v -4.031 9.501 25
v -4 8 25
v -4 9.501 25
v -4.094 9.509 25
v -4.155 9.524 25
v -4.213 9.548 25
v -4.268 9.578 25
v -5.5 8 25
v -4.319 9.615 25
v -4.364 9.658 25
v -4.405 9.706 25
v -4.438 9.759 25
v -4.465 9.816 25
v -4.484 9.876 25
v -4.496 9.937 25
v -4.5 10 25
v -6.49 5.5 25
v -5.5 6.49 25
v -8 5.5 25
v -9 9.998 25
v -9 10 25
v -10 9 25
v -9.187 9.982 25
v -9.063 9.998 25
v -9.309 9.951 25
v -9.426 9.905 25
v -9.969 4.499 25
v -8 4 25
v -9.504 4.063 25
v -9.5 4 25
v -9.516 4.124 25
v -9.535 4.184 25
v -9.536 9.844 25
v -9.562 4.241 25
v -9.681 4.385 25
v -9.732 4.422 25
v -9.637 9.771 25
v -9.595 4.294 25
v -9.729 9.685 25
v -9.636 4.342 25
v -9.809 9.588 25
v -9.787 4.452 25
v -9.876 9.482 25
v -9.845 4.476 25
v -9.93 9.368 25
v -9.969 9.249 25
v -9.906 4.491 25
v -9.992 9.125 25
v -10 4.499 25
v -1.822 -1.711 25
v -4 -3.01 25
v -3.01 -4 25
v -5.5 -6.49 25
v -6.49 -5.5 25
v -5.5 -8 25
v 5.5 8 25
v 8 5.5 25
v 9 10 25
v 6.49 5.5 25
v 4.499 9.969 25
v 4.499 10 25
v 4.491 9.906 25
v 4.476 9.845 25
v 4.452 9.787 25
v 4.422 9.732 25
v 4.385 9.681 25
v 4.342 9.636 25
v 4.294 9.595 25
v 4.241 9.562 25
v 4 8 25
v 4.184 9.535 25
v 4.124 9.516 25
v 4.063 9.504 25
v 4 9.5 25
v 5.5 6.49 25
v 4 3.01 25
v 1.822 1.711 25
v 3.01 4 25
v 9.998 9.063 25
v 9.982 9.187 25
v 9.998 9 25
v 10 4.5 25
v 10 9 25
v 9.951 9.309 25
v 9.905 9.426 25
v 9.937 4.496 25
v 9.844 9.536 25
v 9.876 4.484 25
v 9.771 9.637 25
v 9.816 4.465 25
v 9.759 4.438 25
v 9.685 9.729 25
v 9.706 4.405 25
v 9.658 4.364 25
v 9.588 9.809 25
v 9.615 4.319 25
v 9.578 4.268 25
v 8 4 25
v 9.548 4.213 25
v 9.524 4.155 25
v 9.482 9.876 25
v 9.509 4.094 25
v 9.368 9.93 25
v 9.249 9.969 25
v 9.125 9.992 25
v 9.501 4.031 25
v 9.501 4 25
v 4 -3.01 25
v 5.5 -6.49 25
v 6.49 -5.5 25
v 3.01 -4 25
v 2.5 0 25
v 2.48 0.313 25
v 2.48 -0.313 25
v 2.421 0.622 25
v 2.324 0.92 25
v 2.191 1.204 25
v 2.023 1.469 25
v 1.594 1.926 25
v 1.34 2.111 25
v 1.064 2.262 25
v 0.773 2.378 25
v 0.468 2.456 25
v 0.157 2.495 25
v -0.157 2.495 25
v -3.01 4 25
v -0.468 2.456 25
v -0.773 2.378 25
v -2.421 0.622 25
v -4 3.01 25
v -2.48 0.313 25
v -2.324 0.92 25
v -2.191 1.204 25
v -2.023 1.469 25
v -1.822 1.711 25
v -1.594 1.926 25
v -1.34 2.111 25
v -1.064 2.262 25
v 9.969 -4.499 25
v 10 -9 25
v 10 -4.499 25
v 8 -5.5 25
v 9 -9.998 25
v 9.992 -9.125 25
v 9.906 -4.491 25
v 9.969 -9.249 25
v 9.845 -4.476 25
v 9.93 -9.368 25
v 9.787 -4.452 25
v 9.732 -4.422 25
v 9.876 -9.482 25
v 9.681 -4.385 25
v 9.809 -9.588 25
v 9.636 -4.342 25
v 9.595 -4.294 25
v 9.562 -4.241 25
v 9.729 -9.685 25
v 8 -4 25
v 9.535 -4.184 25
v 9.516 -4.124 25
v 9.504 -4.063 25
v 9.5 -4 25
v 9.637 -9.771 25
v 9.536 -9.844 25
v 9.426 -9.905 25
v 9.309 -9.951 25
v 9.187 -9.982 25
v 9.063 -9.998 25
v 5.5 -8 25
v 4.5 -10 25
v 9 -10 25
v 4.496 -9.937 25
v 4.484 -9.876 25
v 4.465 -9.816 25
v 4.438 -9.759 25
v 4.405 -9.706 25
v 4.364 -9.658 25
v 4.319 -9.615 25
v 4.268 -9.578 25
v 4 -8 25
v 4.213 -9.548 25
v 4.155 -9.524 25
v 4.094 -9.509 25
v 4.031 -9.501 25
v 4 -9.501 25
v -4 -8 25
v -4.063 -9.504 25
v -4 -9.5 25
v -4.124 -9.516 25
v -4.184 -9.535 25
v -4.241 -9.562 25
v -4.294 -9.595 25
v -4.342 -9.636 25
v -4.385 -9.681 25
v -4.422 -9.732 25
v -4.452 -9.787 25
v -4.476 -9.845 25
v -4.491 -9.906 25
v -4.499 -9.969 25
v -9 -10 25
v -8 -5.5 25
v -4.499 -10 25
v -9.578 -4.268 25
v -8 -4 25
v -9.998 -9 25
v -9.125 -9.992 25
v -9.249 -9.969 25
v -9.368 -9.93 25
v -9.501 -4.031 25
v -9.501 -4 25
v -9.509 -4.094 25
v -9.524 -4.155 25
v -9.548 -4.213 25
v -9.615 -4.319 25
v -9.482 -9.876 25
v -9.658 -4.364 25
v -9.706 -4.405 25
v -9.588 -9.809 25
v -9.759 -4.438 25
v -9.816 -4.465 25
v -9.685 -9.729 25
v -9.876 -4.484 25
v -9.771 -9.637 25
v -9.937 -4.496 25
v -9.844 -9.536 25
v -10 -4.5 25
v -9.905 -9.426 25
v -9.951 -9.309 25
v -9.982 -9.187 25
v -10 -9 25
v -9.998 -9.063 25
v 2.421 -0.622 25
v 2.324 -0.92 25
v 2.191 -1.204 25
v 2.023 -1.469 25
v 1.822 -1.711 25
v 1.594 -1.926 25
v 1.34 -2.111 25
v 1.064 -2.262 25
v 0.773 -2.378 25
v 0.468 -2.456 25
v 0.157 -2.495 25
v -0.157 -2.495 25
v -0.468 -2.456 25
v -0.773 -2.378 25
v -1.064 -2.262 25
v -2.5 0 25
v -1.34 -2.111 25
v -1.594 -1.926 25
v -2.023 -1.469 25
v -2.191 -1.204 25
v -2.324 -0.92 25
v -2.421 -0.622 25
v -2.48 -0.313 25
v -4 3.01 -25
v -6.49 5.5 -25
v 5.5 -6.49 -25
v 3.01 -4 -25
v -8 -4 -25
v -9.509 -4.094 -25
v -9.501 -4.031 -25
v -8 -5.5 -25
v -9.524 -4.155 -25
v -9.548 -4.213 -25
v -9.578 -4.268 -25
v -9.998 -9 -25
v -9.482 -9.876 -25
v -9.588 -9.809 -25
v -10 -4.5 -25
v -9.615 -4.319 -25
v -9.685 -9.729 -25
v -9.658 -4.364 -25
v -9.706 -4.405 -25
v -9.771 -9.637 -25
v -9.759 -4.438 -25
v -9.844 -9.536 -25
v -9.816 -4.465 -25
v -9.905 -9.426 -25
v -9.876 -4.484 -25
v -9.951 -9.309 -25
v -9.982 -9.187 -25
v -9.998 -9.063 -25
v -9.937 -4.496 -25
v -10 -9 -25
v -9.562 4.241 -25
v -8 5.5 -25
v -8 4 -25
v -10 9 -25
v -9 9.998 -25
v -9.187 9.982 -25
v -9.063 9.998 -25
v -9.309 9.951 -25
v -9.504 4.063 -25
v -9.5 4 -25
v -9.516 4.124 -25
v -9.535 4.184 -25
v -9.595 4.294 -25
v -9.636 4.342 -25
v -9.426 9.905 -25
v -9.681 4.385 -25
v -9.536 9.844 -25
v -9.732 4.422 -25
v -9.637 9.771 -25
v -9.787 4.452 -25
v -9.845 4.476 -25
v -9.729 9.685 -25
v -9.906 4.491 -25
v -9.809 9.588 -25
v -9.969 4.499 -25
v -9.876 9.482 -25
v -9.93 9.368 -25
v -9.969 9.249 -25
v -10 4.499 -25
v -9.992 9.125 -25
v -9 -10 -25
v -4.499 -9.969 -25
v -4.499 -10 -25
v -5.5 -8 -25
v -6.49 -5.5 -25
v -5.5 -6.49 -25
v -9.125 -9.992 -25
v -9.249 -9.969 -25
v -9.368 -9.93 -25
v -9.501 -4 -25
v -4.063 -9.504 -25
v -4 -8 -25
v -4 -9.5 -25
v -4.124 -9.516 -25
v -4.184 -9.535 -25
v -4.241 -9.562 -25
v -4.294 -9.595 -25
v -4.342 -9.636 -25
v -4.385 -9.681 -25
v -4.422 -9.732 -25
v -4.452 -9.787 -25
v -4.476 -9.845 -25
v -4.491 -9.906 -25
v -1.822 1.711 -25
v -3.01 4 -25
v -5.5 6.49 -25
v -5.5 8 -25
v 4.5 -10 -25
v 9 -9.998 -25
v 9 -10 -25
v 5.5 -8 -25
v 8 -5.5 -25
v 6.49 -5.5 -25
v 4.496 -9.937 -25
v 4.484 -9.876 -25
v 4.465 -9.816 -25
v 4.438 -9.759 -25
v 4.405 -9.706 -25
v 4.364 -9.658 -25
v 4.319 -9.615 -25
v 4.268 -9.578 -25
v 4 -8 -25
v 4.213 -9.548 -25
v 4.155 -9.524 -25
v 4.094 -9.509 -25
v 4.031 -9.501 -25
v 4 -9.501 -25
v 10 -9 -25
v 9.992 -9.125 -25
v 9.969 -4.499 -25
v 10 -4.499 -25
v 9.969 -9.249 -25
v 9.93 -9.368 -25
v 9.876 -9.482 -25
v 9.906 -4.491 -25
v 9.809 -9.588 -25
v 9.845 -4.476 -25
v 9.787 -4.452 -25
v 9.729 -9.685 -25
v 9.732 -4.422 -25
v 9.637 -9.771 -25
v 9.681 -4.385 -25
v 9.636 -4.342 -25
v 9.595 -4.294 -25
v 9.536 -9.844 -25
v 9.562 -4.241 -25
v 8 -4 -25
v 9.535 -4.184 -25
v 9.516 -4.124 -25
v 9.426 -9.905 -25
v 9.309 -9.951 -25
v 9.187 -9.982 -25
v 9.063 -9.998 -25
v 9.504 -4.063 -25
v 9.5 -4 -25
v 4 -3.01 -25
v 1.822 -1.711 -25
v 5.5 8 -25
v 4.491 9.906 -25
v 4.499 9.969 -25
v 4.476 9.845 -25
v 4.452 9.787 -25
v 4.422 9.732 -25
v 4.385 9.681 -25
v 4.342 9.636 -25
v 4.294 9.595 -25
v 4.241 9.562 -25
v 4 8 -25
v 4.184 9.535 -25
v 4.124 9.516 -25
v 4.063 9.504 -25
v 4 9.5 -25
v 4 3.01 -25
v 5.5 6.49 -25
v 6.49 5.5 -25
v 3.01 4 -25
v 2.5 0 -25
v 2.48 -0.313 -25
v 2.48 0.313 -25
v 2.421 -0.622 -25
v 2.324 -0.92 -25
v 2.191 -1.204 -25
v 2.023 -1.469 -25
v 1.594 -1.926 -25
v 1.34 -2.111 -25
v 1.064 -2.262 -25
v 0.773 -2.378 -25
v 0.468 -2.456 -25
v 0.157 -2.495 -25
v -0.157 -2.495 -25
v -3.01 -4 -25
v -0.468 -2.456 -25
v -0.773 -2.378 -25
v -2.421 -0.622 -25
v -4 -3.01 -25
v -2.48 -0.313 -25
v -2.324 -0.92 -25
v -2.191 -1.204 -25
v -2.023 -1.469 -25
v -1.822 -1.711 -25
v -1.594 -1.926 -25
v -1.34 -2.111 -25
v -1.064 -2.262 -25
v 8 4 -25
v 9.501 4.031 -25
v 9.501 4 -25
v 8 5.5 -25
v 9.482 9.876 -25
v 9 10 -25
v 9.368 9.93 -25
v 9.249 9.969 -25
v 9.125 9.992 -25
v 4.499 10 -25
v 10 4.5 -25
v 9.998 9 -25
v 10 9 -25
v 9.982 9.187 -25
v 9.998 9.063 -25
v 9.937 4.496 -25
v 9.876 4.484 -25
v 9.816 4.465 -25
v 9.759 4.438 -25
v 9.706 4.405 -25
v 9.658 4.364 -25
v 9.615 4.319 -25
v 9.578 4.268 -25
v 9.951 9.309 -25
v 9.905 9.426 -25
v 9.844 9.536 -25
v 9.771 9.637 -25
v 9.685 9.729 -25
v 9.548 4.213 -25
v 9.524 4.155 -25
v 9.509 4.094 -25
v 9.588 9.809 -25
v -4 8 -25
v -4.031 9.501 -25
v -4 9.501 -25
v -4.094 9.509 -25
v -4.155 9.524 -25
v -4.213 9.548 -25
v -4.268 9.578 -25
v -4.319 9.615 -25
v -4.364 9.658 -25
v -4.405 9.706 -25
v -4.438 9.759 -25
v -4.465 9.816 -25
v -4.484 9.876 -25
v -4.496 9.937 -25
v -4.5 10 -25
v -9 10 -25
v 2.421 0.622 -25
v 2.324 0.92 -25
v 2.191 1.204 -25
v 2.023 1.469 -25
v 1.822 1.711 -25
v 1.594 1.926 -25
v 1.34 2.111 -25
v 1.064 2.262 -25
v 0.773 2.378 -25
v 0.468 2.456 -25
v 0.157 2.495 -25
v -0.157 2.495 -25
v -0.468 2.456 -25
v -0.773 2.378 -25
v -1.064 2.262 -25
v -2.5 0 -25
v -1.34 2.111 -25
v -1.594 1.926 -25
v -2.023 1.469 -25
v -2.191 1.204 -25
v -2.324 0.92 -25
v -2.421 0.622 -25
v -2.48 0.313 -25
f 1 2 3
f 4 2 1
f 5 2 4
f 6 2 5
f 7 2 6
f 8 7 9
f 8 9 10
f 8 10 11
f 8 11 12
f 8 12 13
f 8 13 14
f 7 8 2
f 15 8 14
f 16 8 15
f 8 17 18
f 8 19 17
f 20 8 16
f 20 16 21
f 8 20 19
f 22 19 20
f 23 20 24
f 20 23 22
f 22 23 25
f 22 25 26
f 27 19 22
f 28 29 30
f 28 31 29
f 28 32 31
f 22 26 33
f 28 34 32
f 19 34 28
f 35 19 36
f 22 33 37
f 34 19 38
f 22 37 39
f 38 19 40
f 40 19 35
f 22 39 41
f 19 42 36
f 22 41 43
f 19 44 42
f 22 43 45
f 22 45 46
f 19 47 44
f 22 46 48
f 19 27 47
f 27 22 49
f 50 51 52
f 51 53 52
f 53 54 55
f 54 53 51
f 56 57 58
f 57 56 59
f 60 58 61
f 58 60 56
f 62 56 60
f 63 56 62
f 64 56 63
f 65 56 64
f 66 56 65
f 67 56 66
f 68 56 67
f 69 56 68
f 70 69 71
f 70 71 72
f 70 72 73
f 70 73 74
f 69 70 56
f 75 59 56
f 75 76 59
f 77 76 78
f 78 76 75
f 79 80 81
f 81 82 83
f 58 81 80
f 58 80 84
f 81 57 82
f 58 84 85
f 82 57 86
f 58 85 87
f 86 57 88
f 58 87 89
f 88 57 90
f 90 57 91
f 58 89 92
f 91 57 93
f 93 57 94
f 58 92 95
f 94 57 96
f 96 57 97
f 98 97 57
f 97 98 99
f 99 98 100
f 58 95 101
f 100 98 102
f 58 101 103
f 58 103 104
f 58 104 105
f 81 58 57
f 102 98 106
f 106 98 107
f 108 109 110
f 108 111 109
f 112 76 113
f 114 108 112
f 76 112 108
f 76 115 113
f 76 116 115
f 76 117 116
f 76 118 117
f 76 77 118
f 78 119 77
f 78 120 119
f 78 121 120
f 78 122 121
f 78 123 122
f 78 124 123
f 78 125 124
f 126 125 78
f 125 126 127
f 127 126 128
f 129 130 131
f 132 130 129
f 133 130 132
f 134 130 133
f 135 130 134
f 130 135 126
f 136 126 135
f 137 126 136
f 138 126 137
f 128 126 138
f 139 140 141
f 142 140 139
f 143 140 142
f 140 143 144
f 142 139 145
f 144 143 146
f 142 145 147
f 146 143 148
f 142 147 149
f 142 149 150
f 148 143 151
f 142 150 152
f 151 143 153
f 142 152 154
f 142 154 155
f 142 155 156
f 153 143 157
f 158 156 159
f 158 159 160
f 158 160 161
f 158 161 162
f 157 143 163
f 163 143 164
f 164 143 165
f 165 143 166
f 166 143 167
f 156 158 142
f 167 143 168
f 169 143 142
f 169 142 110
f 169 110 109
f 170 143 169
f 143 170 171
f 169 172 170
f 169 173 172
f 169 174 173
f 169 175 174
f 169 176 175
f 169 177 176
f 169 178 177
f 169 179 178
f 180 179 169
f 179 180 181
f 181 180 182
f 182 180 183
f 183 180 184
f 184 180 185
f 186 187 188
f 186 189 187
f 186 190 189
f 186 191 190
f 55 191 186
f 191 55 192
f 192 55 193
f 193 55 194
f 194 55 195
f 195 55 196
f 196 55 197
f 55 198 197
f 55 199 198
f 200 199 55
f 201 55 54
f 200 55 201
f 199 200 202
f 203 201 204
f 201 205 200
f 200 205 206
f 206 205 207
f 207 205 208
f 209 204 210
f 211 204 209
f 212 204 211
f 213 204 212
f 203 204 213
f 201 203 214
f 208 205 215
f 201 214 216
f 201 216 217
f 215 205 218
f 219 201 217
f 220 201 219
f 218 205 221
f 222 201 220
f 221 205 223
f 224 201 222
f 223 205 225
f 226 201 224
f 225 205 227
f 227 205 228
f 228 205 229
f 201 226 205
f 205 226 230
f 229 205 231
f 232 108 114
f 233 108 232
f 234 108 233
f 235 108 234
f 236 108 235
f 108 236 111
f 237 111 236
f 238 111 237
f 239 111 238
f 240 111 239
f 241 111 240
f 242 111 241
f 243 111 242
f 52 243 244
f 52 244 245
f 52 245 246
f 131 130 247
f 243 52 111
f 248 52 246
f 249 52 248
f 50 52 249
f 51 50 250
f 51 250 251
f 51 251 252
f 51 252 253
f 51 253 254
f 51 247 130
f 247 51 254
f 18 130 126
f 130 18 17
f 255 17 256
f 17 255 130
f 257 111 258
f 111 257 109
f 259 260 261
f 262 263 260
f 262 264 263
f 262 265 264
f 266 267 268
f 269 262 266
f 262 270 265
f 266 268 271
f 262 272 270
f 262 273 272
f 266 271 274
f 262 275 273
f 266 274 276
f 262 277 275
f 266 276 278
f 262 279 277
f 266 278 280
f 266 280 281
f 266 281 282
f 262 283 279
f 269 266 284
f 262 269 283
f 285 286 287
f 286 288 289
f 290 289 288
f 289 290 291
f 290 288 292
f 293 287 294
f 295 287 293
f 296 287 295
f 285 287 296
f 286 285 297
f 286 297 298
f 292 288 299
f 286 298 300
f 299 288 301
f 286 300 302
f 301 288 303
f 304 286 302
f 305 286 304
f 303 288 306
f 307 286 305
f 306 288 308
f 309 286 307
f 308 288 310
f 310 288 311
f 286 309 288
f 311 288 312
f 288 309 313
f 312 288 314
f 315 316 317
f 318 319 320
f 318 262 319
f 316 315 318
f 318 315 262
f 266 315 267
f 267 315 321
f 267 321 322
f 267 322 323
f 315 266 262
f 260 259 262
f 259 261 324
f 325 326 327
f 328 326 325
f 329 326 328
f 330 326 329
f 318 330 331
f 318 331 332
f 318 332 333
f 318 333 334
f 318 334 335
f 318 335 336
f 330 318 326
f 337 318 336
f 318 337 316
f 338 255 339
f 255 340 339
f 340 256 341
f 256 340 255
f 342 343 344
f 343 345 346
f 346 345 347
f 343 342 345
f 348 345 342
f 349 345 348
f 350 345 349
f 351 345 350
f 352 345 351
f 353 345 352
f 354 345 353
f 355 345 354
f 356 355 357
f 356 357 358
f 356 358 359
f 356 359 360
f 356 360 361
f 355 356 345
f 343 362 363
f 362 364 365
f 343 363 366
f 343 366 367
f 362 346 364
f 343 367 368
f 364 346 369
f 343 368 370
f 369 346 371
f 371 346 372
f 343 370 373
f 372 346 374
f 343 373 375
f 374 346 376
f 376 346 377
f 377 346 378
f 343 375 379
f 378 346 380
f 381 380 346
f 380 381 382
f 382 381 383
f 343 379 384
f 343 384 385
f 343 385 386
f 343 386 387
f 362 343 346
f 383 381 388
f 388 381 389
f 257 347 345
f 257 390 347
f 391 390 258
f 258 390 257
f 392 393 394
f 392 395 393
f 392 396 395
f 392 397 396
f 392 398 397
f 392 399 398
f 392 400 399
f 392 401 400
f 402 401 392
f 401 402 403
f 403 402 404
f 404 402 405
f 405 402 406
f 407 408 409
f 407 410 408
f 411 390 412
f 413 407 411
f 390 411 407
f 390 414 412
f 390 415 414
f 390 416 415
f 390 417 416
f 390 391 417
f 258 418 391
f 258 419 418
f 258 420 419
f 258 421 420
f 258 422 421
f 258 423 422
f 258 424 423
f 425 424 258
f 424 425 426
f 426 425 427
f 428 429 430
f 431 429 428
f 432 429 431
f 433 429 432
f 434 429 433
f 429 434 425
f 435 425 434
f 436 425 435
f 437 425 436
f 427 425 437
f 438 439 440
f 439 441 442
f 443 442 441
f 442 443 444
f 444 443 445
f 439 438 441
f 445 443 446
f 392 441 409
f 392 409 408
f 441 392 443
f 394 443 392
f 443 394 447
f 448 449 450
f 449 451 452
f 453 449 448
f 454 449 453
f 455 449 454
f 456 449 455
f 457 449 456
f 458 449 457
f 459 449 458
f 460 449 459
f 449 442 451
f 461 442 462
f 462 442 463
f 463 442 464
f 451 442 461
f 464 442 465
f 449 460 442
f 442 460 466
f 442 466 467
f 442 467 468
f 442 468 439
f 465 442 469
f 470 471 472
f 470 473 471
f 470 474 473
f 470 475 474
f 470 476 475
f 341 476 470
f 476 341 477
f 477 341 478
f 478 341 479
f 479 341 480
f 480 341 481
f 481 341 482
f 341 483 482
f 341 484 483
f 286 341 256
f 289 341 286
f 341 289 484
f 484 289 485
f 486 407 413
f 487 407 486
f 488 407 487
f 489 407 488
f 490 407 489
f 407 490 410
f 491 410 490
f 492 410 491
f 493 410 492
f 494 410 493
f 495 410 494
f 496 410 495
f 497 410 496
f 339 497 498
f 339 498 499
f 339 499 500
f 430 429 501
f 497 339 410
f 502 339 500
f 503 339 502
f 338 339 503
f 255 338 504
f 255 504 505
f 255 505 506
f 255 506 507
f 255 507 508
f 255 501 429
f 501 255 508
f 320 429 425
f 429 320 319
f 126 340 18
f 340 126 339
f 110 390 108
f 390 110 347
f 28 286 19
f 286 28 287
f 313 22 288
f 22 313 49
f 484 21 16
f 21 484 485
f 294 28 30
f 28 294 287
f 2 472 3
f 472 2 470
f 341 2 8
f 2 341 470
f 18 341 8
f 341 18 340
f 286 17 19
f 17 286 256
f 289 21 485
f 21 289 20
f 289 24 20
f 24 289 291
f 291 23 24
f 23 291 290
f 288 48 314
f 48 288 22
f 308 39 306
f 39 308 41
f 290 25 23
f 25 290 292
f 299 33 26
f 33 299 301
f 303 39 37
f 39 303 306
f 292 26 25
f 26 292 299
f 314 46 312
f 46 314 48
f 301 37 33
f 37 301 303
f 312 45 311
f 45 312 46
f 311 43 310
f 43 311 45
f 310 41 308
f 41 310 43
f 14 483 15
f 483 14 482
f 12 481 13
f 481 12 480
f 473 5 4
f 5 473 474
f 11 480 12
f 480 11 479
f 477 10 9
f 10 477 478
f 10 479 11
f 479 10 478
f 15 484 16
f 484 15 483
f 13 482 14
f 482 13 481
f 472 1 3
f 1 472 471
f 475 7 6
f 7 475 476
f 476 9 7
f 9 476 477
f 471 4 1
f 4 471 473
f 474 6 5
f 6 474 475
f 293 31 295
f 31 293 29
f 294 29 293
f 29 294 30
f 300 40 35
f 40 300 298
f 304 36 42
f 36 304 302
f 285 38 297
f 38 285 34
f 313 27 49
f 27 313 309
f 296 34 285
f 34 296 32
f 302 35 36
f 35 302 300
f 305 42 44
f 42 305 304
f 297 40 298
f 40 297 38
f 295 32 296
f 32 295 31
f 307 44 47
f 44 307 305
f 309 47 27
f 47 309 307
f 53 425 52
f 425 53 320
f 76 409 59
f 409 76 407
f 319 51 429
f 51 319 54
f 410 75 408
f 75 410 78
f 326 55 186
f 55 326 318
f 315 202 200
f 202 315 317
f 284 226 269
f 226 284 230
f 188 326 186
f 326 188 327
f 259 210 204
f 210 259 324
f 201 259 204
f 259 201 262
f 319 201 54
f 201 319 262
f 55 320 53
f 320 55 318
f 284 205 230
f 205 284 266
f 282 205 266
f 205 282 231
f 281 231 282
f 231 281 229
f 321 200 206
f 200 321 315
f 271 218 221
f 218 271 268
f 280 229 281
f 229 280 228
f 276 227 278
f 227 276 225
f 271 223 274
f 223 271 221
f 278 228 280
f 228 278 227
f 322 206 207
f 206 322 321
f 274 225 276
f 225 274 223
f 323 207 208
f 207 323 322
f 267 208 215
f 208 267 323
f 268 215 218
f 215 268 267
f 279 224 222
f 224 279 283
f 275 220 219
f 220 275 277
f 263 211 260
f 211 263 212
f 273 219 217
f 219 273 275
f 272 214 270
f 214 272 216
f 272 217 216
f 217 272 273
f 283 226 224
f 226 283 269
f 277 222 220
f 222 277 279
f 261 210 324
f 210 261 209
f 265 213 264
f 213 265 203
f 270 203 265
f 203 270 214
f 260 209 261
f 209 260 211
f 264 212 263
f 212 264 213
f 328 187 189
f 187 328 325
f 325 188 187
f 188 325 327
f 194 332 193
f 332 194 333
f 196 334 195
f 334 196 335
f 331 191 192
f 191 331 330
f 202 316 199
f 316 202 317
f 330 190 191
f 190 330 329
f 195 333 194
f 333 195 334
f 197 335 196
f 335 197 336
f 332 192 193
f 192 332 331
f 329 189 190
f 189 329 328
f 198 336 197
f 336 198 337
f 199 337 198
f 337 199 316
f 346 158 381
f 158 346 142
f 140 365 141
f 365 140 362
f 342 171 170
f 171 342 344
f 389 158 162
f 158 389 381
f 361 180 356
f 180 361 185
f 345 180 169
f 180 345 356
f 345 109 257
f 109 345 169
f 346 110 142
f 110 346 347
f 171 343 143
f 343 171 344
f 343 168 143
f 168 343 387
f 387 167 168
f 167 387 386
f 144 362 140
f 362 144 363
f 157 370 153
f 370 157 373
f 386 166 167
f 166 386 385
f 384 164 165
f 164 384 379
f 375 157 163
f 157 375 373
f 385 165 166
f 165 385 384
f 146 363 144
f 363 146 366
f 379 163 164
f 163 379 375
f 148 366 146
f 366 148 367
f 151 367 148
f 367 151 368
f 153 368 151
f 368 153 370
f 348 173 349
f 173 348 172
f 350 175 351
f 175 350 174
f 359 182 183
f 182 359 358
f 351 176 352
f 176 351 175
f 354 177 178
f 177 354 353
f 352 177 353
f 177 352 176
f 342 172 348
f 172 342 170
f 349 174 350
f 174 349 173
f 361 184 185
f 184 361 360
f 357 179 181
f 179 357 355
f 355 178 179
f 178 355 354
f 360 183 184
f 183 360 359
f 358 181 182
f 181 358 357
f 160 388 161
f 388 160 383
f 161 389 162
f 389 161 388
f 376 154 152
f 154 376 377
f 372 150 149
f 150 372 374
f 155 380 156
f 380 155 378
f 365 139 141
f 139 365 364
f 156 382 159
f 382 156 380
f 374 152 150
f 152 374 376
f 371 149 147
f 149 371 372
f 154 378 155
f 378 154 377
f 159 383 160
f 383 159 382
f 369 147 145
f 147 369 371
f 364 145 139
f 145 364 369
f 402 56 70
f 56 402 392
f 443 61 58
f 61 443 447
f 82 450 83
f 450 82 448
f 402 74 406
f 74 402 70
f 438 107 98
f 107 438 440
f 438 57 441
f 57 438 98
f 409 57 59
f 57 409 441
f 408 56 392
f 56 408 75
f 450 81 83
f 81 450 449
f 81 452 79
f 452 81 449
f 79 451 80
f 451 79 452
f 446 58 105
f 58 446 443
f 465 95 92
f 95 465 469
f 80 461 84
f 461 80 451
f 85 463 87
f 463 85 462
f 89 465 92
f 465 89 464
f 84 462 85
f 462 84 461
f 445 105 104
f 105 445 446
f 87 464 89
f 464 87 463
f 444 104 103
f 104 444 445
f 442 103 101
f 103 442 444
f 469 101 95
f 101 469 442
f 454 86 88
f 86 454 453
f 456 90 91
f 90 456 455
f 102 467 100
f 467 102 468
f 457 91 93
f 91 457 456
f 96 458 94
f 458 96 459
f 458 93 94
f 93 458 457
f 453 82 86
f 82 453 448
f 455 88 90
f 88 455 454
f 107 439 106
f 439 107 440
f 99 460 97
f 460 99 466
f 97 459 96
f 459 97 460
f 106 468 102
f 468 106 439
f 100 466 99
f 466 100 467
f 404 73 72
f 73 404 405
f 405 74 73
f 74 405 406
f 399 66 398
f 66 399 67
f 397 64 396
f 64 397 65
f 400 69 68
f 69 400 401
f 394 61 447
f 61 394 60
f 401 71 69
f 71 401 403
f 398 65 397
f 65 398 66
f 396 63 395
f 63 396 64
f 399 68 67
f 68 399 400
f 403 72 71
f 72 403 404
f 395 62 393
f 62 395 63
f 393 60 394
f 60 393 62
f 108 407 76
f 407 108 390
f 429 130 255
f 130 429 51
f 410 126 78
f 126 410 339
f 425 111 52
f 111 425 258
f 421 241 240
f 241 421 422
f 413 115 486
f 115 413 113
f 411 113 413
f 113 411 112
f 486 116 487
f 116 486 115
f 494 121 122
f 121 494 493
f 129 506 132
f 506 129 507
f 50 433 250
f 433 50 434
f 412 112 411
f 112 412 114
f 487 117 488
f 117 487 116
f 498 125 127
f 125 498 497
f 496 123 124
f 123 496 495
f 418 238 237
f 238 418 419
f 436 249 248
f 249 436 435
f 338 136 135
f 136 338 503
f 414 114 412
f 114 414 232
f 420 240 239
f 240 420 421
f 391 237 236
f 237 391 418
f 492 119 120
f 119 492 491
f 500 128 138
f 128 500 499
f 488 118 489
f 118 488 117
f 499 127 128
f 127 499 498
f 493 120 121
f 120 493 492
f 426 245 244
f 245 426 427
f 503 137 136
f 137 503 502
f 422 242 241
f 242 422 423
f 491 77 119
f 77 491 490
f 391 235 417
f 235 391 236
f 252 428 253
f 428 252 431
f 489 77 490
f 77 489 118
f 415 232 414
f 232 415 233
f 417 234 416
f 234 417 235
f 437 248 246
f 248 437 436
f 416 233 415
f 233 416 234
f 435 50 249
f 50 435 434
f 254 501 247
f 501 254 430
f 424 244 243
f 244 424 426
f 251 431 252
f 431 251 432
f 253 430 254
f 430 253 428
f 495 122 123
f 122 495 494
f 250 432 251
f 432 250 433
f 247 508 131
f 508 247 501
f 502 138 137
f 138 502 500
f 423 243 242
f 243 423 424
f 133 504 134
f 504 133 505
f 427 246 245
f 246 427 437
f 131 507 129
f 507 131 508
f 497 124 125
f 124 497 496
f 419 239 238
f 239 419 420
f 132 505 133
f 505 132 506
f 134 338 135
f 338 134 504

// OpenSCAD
$fn=50;

module makerBeam(length)
{
	difference(){
		union(){
			// body
			cube([8,8,length], center=true);
			// corners
			for (i=[0:3]){
				rotate([0, 0, i*90]){corner(length);}
			}
		}
		// center hole
		cylinder(h=length, r=2.5, center=true);
	};
}

module corner(length){
	difference(){
		union(){
			// arm
			rotate([0, 0, 45]){
				translate([0,5,0]){cube([1.4, 15, length], center=true);}
			}

			translate([-9, 7, 0]){cube([2, 6, length], center=true);}
			translate([-7, 9, 0]){cube([6, 2, length], center=true);}
			translate([-7, 7, 0]){cube([3, 3, length], center=true);}
		}

		translate([-4, 10, 0]){cylinder(h=length, r=0.5, center=true);}
		translate([-10, 4, 0]){cylinder(h=length, r=0.5, center=true);}

		// round external shape
		difference(){
			translate([-9.5, 9.5, 0]){cube([1, 1, length], center=true);}
			translate([-9, 9, 0]){cylinder(h=length, r=1, center=true);}
		}
	}
}


makerBeam(50);
